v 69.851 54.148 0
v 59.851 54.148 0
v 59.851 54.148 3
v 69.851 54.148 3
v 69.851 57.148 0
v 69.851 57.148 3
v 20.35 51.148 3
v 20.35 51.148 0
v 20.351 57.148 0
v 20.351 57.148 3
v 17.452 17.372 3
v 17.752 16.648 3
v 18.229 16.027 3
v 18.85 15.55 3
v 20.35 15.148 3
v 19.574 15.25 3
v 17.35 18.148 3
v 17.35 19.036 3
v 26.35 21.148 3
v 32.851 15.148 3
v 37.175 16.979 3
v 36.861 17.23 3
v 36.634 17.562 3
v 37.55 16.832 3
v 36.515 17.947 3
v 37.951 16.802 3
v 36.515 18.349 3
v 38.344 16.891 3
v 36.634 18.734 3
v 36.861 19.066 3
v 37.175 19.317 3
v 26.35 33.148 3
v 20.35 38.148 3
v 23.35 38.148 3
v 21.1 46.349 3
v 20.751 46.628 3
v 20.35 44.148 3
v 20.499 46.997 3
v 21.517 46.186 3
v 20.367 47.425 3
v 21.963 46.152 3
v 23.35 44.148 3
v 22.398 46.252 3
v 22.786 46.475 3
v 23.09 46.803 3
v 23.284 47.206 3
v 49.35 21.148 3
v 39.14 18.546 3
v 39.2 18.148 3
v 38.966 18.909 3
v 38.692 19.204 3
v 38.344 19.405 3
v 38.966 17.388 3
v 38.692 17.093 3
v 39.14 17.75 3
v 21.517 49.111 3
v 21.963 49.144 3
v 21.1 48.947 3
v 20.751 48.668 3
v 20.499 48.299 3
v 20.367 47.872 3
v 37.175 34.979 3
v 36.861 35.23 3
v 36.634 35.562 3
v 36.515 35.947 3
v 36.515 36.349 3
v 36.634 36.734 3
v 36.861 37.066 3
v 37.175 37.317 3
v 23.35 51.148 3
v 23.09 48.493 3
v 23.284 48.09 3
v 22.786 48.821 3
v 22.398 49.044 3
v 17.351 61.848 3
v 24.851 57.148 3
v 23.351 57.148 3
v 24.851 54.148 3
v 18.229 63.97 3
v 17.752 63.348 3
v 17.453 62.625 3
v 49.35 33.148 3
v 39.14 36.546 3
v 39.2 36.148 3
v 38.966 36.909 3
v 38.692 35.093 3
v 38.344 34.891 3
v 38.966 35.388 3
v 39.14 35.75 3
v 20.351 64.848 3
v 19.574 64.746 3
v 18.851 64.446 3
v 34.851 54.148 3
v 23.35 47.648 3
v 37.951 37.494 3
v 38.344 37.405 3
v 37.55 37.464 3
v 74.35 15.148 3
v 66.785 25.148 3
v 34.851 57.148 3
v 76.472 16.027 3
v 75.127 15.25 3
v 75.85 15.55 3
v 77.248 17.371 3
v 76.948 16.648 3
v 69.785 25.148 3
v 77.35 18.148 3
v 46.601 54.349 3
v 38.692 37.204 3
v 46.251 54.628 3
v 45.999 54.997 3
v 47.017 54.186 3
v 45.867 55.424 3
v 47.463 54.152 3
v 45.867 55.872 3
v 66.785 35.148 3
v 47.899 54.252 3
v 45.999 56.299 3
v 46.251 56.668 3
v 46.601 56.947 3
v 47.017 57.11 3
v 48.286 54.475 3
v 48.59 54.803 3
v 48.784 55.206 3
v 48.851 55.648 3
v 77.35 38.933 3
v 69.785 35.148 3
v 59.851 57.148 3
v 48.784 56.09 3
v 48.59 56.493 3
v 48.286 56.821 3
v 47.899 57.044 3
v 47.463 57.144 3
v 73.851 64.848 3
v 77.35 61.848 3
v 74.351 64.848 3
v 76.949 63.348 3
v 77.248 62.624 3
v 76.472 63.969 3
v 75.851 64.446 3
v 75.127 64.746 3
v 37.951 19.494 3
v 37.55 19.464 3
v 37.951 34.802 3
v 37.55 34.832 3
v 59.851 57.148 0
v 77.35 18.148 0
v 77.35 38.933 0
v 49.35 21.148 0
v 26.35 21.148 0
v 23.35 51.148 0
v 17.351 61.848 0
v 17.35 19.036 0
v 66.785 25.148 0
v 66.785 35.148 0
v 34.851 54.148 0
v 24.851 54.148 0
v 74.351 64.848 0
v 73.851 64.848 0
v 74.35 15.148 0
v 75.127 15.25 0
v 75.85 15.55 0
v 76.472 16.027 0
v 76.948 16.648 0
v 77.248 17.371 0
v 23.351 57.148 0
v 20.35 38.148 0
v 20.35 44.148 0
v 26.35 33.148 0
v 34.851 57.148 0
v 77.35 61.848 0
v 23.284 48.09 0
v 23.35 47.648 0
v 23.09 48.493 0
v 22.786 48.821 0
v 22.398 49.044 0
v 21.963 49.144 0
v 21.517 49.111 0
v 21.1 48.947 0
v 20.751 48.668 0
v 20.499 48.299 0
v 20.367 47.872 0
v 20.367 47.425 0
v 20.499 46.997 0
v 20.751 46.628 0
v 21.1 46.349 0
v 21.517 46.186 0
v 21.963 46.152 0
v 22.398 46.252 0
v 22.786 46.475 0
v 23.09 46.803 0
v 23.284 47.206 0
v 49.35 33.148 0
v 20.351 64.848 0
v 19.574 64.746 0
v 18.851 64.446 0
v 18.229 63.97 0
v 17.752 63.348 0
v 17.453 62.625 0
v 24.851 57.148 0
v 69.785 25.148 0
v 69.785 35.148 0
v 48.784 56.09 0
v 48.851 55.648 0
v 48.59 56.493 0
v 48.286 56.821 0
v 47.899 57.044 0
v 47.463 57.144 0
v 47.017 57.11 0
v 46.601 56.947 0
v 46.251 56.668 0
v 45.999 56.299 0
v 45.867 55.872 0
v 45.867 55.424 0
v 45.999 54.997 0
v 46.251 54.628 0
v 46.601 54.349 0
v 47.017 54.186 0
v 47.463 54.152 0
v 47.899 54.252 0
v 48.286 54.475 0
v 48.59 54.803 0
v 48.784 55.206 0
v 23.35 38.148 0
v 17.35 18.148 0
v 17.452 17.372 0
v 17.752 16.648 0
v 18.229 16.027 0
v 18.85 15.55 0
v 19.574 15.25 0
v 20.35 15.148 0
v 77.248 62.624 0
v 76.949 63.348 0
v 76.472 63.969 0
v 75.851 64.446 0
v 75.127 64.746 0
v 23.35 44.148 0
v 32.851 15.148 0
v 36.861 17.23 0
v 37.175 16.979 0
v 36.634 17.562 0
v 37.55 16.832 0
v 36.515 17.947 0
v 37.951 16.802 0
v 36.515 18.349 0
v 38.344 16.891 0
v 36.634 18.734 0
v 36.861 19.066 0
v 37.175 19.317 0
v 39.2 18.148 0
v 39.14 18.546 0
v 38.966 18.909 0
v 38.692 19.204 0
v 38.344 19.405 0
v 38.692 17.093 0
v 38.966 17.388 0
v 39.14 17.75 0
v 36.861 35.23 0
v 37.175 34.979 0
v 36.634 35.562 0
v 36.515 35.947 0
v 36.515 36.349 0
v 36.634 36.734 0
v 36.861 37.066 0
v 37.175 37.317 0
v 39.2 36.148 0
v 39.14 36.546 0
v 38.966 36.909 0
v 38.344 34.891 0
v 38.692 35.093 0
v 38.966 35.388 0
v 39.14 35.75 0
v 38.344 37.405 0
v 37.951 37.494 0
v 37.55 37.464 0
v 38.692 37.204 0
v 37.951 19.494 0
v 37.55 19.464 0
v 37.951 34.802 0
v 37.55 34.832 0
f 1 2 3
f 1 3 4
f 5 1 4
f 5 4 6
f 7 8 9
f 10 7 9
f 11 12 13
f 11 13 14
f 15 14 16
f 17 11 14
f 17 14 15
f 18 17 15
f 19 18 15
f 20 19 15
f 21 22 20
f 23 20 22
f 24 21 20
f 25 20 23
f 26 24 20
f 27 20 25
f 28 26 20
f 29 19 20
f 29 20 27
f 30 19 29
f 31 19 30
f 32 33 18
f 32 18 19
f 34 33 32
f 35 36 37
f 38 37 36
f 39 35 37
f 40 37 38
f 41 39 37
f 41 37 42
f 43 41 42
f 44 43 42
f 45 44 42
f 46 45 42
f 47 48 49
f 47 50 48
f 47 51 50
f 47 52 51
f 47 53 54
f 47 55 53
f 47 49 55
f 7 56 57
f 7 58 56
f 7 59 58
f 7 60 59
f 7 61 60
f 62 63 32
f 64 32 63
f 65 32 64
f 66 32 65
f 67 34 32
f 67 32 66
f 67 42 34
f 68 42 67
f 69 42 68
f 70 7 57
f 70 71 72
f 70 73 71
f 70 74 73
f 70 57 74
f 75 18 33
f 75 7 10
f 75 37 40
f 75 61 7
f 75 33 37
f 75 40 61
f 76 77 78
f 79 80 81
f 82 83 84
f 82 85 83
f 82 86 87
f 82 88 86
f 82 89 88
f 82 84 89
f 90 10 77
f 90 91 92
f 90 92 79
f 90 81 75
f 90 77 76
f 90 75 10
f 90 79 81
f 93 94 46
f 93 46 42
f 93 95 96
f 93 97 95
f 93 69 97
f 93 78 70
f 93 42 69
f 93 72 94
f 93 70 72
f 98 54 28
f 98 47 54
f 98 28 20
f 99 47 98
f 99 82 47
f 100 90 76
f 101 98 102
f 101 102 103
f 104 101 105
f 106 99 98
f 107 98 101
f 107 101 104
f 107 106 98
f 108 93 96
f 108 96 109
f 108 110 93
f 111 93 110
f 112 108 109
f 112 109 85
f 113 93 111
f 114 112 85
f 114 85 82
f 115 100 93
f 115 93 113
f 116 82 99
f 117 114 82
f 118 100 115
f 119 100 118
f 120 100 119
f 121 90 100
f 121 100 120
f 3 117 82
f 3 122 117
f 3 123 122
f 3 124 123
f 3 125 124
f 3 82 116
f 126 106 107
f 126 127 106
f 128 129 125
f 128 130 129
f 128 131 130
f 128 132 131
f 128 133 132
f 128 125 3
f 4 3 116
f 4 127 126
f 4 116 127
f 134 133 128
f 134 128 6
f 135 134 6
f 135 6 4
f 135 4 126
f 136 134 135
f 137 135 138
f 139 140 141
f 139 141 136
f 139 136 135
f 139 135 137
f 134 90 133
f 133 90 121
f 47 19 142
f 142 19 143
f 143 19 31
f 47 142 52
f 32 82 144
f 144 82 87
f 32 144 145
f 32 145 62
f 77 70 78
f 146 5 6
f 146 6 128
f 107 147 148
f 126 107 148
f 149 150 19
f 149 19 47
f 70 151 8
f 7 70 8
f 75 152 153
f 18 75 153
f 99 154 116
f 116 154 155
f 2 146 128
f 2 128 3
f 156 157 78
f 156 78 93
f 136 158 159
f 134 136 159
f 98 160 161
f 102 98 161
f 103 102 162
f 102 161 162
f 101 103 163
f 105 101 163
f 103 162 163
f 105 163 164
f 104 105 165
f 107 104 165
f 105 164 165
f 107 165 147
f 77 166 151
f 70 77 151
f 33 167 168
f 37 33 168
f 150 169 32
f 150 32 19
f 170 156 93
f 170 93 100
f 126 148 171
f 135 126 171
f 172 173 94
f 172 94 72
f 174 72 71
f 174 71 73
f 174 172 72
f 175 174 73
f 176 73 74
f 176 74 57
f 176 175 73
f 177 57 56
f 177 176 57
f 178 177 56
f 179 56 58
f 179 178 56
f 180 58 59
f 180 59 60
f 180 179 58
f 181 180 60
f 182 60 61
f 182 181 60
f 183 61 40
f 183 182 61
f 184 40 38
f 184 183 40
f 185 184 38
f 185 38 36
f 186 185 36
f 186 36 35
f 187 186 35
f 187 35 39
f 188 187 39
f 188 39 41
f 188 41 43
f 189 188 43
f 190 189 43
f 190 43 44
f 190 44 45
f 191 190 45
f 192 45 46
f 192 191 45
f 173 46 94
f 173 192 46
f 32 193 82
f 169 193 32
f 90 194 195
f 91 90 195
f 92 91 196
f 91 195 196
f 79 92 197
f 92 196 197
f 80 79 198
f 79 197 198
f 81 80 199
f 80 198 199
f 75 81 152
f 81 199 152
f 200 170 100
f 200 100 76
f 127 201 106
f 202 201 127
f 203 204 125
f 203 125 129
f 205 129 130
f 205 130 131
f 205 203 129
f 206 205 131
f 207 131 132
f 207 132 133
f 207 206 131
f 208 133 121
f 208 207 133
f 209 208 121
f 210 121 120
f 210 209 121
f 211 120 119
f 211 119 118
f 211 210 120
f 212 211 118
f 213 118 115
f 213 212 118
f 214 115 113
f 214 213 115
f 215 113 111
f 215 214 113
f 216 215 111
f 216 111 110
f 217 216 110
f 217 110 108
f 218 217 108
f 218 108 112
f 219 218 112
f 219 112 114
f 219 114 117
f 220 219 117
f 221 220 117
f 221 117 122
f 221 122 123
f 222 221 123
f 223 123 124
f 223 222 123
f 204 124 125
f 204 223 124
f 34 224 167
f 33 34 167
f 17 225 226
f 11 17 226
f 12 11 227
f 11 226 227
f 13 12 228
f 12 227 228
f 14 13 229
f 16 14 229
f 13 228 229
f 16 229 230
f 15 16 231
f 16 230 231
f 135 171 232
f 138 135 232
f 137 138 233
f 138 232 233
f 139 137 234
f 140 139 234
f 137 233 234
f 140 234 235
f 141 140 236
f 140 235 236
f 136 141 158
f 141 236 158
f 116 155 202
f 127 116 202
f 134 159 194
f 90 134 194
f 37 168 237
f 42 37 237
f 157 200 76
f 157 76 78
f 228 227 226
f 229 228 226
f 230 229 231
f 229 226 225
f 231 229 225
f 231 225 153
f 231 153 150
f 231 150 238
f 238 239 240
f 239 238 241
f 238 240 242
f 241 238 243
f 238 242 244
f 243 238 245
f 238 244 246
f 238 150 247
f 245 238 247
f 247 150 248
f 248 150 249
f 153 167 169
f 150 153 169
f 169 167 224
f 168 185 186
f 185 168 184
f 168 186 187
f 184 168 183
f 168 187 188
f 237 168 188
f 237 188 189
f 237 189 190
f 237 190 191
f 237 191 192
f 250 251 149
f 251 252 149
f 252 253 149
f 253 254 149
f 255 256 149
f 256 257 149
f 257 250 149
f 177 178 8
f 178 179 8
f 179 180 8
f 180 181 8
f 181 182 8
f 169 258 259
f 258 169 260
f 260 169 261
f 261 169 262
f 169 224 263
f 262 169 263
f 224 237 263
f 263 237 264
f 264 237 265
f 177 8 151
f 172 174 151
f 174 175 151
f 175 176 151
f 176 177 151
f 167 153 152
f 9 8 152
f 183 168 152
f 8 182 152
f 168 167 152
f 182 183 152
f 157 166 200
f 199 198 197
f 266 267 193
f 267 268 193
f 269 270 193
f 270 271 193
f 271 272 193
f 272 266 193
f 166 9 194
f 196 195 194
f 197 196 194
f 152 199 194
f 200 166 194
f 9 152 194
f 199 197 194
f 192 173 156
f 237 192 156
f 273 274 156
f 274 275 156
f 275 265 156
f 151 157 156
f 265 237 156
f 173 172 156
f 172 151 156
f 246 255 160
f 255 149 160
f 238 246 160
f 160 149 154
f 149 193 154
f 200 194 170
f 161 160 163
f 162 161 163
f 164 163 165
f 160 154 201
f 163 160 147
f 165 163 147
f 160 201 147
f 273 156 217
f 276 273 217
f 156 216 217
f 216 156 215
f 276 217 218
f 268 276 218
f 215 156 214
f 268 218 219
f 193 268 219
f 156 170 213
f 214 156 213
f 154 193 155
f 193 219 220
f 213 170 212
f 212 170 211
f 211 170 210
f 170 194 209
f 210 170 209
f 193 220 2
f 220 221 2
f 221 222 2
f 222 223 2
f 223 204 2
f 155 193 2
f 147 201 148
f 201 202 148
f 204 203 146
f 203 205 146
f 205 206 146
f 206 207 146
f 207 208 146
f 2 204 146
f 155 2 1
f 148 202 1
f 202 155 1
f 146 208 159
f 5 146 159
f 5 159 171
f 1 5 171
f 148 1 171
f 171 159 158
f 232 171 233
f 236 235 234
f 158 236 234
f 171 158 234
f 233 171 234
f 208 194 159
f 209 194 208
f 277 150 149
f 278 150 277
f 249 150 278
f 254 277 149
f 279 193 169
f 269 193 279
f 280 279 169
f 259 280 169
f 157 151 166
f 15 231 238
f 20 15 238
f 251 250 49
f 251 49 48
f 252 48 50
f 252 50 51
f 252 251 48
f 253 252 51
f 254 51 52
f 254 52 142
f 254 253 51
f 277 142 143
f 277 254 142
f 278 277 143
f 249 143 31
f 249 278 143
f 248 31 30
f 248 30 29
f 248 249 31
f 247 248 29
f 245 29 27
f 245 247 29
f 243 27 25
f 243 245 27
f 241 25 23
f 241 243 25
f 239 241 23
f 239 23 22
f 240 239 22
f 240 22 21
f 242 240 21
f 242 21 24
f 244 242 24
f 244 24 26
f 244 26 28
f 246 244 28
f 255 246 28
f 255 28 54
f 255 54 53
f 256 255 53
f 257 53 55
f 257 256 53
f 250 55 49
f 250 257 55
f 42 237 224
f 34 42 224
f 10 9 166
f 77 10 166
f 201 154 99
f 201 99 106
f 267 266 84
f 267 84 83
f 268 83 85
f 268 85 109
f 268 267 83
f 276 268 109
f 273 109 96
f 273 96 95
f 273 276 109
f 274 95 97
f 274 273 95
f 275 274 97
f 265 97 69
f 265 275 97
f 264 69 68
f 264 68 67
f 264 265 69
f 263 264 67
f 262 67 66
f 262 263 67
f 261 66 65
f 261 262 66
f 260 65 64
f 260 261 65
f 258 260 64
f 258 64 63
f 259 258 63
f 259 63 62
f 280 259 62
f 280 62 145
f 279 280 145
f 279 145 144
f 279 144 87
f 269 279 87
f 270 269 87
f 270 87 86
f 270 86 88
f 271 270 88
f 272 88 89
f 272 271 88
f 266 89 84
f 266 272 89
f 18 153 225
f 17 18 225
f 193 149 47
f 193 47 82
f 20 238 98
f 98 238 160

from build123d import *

# Parameters (mm, degrees)
MODEL_R             = 1.500000002
MODEL_R_2           = 1.35
MODEL_R_3           = 1.500000003
MODEL_W             = 3
MODEL_H             = 10
BOSS_EXTRUDE1_DEPTH = 3


with BuildPart() as part:
    # Model → Boss-Extrude1 (new body)
    with BuildSketch(Plane.XY):
        with BuildLine():
            Line((77.350374728, 38.932799758), (77.3504385, 61.847914879))
            ThreePointArc((77.3504385, 61.847914879), (76.471798677, 63.969197152), (74.350545547, 64.84790733))
            Line((74.350545547, 64.84790733), (73.850545547, 64.84790733))
            Line((73.850545547, 64.84790733), (20.350545547, 64.848184253))
            ThreePointArc((20.350545547, 64.848184253), (18.229231749, 63.96968584), (17.350530152, 61.848456197))
            Line((17.350530152, 61.848456197), (17.350325984, 19.035510771))
            Line((17.350325984, 19.035510771), (17.350321434, 18.148199638))
            ThreePointArc((17.350321434, 18.148199638), (18.228860554, 16.026745133), (20.350306049, 15.148184254))
            Line((20.350306049, 15.148184254), (32.850606049, 15.14812015))
            Line((32.850606049, 15.14812015), (74.350306048, 15.147907331))
            ThreePointArc((74.350306048, 15.147907331), (76.471660555, 16.026546451), (77.350321433, 18.147891946))
            Line((77.350321433, 18.147891946), (77.350374728, 38.932799758))
        make_face()
        with Locations((47.350513739, 55.648045793)):
            Circle(MODEL_R, mode=Mode.SUBTRACT)
        with Locations((37.850318867, 18.148094512)):
            Circle(MODEL_R_2, mode=Mode.SUBTRACT)
        with Locations((37.850416303, 36.148094512)):
            Circle(MODEL_R_2, mode=Mode.SUBTRACT)
        with Locations((21.850472716, 47.648176561)):
            Circle(MODEL_R_3, mode=Mode.SUBTRACT)
        Polygon((23.350454767, 44.148168869), (23.350423998, 38.148168869), (20.350423998, 38.148184254), (20.350454767, 44.148184254), align=None, mode=Mode.SUBTRACT)
        Polygon((23.350521434, 57.148168869), (23.350490665, 51.148168869), (20.350490665, 51.148184253), (20.350521434, 57.148184253), align=None, mode=Mode.SUBTRACT)
        Polygon((49.350336818, 21.148035536), (49.350398356, 33.148035536), (26.350398357, 33.148153484), (26.350336818, 21.148153485), align=None, mode=Mode.SUBTRACT)
        Polygon((34.850506049, 54.148109894), (34.850521434, 57.148109894), (24.850521434, 57.148161176), (24.850506049, 54.148161176), align=None, mode=Mode.SUBTRACT)
        Polygon((69.850505905, 54.147930167), (69.850521433, 57.147930167), (59.850505905, 57.147981929), (59.850505905, 54.147930167), align=None, mode=Mode.SUBTRACT)
        with Locations((68.28527947, 30.147930167)):
            Rectangle(MODEL_W, MODEL_H, mode=Mode.SUBTRACT)
    extrude(amount=BOSS_EXTRUDE1_DEPTH)


solid = part.part
